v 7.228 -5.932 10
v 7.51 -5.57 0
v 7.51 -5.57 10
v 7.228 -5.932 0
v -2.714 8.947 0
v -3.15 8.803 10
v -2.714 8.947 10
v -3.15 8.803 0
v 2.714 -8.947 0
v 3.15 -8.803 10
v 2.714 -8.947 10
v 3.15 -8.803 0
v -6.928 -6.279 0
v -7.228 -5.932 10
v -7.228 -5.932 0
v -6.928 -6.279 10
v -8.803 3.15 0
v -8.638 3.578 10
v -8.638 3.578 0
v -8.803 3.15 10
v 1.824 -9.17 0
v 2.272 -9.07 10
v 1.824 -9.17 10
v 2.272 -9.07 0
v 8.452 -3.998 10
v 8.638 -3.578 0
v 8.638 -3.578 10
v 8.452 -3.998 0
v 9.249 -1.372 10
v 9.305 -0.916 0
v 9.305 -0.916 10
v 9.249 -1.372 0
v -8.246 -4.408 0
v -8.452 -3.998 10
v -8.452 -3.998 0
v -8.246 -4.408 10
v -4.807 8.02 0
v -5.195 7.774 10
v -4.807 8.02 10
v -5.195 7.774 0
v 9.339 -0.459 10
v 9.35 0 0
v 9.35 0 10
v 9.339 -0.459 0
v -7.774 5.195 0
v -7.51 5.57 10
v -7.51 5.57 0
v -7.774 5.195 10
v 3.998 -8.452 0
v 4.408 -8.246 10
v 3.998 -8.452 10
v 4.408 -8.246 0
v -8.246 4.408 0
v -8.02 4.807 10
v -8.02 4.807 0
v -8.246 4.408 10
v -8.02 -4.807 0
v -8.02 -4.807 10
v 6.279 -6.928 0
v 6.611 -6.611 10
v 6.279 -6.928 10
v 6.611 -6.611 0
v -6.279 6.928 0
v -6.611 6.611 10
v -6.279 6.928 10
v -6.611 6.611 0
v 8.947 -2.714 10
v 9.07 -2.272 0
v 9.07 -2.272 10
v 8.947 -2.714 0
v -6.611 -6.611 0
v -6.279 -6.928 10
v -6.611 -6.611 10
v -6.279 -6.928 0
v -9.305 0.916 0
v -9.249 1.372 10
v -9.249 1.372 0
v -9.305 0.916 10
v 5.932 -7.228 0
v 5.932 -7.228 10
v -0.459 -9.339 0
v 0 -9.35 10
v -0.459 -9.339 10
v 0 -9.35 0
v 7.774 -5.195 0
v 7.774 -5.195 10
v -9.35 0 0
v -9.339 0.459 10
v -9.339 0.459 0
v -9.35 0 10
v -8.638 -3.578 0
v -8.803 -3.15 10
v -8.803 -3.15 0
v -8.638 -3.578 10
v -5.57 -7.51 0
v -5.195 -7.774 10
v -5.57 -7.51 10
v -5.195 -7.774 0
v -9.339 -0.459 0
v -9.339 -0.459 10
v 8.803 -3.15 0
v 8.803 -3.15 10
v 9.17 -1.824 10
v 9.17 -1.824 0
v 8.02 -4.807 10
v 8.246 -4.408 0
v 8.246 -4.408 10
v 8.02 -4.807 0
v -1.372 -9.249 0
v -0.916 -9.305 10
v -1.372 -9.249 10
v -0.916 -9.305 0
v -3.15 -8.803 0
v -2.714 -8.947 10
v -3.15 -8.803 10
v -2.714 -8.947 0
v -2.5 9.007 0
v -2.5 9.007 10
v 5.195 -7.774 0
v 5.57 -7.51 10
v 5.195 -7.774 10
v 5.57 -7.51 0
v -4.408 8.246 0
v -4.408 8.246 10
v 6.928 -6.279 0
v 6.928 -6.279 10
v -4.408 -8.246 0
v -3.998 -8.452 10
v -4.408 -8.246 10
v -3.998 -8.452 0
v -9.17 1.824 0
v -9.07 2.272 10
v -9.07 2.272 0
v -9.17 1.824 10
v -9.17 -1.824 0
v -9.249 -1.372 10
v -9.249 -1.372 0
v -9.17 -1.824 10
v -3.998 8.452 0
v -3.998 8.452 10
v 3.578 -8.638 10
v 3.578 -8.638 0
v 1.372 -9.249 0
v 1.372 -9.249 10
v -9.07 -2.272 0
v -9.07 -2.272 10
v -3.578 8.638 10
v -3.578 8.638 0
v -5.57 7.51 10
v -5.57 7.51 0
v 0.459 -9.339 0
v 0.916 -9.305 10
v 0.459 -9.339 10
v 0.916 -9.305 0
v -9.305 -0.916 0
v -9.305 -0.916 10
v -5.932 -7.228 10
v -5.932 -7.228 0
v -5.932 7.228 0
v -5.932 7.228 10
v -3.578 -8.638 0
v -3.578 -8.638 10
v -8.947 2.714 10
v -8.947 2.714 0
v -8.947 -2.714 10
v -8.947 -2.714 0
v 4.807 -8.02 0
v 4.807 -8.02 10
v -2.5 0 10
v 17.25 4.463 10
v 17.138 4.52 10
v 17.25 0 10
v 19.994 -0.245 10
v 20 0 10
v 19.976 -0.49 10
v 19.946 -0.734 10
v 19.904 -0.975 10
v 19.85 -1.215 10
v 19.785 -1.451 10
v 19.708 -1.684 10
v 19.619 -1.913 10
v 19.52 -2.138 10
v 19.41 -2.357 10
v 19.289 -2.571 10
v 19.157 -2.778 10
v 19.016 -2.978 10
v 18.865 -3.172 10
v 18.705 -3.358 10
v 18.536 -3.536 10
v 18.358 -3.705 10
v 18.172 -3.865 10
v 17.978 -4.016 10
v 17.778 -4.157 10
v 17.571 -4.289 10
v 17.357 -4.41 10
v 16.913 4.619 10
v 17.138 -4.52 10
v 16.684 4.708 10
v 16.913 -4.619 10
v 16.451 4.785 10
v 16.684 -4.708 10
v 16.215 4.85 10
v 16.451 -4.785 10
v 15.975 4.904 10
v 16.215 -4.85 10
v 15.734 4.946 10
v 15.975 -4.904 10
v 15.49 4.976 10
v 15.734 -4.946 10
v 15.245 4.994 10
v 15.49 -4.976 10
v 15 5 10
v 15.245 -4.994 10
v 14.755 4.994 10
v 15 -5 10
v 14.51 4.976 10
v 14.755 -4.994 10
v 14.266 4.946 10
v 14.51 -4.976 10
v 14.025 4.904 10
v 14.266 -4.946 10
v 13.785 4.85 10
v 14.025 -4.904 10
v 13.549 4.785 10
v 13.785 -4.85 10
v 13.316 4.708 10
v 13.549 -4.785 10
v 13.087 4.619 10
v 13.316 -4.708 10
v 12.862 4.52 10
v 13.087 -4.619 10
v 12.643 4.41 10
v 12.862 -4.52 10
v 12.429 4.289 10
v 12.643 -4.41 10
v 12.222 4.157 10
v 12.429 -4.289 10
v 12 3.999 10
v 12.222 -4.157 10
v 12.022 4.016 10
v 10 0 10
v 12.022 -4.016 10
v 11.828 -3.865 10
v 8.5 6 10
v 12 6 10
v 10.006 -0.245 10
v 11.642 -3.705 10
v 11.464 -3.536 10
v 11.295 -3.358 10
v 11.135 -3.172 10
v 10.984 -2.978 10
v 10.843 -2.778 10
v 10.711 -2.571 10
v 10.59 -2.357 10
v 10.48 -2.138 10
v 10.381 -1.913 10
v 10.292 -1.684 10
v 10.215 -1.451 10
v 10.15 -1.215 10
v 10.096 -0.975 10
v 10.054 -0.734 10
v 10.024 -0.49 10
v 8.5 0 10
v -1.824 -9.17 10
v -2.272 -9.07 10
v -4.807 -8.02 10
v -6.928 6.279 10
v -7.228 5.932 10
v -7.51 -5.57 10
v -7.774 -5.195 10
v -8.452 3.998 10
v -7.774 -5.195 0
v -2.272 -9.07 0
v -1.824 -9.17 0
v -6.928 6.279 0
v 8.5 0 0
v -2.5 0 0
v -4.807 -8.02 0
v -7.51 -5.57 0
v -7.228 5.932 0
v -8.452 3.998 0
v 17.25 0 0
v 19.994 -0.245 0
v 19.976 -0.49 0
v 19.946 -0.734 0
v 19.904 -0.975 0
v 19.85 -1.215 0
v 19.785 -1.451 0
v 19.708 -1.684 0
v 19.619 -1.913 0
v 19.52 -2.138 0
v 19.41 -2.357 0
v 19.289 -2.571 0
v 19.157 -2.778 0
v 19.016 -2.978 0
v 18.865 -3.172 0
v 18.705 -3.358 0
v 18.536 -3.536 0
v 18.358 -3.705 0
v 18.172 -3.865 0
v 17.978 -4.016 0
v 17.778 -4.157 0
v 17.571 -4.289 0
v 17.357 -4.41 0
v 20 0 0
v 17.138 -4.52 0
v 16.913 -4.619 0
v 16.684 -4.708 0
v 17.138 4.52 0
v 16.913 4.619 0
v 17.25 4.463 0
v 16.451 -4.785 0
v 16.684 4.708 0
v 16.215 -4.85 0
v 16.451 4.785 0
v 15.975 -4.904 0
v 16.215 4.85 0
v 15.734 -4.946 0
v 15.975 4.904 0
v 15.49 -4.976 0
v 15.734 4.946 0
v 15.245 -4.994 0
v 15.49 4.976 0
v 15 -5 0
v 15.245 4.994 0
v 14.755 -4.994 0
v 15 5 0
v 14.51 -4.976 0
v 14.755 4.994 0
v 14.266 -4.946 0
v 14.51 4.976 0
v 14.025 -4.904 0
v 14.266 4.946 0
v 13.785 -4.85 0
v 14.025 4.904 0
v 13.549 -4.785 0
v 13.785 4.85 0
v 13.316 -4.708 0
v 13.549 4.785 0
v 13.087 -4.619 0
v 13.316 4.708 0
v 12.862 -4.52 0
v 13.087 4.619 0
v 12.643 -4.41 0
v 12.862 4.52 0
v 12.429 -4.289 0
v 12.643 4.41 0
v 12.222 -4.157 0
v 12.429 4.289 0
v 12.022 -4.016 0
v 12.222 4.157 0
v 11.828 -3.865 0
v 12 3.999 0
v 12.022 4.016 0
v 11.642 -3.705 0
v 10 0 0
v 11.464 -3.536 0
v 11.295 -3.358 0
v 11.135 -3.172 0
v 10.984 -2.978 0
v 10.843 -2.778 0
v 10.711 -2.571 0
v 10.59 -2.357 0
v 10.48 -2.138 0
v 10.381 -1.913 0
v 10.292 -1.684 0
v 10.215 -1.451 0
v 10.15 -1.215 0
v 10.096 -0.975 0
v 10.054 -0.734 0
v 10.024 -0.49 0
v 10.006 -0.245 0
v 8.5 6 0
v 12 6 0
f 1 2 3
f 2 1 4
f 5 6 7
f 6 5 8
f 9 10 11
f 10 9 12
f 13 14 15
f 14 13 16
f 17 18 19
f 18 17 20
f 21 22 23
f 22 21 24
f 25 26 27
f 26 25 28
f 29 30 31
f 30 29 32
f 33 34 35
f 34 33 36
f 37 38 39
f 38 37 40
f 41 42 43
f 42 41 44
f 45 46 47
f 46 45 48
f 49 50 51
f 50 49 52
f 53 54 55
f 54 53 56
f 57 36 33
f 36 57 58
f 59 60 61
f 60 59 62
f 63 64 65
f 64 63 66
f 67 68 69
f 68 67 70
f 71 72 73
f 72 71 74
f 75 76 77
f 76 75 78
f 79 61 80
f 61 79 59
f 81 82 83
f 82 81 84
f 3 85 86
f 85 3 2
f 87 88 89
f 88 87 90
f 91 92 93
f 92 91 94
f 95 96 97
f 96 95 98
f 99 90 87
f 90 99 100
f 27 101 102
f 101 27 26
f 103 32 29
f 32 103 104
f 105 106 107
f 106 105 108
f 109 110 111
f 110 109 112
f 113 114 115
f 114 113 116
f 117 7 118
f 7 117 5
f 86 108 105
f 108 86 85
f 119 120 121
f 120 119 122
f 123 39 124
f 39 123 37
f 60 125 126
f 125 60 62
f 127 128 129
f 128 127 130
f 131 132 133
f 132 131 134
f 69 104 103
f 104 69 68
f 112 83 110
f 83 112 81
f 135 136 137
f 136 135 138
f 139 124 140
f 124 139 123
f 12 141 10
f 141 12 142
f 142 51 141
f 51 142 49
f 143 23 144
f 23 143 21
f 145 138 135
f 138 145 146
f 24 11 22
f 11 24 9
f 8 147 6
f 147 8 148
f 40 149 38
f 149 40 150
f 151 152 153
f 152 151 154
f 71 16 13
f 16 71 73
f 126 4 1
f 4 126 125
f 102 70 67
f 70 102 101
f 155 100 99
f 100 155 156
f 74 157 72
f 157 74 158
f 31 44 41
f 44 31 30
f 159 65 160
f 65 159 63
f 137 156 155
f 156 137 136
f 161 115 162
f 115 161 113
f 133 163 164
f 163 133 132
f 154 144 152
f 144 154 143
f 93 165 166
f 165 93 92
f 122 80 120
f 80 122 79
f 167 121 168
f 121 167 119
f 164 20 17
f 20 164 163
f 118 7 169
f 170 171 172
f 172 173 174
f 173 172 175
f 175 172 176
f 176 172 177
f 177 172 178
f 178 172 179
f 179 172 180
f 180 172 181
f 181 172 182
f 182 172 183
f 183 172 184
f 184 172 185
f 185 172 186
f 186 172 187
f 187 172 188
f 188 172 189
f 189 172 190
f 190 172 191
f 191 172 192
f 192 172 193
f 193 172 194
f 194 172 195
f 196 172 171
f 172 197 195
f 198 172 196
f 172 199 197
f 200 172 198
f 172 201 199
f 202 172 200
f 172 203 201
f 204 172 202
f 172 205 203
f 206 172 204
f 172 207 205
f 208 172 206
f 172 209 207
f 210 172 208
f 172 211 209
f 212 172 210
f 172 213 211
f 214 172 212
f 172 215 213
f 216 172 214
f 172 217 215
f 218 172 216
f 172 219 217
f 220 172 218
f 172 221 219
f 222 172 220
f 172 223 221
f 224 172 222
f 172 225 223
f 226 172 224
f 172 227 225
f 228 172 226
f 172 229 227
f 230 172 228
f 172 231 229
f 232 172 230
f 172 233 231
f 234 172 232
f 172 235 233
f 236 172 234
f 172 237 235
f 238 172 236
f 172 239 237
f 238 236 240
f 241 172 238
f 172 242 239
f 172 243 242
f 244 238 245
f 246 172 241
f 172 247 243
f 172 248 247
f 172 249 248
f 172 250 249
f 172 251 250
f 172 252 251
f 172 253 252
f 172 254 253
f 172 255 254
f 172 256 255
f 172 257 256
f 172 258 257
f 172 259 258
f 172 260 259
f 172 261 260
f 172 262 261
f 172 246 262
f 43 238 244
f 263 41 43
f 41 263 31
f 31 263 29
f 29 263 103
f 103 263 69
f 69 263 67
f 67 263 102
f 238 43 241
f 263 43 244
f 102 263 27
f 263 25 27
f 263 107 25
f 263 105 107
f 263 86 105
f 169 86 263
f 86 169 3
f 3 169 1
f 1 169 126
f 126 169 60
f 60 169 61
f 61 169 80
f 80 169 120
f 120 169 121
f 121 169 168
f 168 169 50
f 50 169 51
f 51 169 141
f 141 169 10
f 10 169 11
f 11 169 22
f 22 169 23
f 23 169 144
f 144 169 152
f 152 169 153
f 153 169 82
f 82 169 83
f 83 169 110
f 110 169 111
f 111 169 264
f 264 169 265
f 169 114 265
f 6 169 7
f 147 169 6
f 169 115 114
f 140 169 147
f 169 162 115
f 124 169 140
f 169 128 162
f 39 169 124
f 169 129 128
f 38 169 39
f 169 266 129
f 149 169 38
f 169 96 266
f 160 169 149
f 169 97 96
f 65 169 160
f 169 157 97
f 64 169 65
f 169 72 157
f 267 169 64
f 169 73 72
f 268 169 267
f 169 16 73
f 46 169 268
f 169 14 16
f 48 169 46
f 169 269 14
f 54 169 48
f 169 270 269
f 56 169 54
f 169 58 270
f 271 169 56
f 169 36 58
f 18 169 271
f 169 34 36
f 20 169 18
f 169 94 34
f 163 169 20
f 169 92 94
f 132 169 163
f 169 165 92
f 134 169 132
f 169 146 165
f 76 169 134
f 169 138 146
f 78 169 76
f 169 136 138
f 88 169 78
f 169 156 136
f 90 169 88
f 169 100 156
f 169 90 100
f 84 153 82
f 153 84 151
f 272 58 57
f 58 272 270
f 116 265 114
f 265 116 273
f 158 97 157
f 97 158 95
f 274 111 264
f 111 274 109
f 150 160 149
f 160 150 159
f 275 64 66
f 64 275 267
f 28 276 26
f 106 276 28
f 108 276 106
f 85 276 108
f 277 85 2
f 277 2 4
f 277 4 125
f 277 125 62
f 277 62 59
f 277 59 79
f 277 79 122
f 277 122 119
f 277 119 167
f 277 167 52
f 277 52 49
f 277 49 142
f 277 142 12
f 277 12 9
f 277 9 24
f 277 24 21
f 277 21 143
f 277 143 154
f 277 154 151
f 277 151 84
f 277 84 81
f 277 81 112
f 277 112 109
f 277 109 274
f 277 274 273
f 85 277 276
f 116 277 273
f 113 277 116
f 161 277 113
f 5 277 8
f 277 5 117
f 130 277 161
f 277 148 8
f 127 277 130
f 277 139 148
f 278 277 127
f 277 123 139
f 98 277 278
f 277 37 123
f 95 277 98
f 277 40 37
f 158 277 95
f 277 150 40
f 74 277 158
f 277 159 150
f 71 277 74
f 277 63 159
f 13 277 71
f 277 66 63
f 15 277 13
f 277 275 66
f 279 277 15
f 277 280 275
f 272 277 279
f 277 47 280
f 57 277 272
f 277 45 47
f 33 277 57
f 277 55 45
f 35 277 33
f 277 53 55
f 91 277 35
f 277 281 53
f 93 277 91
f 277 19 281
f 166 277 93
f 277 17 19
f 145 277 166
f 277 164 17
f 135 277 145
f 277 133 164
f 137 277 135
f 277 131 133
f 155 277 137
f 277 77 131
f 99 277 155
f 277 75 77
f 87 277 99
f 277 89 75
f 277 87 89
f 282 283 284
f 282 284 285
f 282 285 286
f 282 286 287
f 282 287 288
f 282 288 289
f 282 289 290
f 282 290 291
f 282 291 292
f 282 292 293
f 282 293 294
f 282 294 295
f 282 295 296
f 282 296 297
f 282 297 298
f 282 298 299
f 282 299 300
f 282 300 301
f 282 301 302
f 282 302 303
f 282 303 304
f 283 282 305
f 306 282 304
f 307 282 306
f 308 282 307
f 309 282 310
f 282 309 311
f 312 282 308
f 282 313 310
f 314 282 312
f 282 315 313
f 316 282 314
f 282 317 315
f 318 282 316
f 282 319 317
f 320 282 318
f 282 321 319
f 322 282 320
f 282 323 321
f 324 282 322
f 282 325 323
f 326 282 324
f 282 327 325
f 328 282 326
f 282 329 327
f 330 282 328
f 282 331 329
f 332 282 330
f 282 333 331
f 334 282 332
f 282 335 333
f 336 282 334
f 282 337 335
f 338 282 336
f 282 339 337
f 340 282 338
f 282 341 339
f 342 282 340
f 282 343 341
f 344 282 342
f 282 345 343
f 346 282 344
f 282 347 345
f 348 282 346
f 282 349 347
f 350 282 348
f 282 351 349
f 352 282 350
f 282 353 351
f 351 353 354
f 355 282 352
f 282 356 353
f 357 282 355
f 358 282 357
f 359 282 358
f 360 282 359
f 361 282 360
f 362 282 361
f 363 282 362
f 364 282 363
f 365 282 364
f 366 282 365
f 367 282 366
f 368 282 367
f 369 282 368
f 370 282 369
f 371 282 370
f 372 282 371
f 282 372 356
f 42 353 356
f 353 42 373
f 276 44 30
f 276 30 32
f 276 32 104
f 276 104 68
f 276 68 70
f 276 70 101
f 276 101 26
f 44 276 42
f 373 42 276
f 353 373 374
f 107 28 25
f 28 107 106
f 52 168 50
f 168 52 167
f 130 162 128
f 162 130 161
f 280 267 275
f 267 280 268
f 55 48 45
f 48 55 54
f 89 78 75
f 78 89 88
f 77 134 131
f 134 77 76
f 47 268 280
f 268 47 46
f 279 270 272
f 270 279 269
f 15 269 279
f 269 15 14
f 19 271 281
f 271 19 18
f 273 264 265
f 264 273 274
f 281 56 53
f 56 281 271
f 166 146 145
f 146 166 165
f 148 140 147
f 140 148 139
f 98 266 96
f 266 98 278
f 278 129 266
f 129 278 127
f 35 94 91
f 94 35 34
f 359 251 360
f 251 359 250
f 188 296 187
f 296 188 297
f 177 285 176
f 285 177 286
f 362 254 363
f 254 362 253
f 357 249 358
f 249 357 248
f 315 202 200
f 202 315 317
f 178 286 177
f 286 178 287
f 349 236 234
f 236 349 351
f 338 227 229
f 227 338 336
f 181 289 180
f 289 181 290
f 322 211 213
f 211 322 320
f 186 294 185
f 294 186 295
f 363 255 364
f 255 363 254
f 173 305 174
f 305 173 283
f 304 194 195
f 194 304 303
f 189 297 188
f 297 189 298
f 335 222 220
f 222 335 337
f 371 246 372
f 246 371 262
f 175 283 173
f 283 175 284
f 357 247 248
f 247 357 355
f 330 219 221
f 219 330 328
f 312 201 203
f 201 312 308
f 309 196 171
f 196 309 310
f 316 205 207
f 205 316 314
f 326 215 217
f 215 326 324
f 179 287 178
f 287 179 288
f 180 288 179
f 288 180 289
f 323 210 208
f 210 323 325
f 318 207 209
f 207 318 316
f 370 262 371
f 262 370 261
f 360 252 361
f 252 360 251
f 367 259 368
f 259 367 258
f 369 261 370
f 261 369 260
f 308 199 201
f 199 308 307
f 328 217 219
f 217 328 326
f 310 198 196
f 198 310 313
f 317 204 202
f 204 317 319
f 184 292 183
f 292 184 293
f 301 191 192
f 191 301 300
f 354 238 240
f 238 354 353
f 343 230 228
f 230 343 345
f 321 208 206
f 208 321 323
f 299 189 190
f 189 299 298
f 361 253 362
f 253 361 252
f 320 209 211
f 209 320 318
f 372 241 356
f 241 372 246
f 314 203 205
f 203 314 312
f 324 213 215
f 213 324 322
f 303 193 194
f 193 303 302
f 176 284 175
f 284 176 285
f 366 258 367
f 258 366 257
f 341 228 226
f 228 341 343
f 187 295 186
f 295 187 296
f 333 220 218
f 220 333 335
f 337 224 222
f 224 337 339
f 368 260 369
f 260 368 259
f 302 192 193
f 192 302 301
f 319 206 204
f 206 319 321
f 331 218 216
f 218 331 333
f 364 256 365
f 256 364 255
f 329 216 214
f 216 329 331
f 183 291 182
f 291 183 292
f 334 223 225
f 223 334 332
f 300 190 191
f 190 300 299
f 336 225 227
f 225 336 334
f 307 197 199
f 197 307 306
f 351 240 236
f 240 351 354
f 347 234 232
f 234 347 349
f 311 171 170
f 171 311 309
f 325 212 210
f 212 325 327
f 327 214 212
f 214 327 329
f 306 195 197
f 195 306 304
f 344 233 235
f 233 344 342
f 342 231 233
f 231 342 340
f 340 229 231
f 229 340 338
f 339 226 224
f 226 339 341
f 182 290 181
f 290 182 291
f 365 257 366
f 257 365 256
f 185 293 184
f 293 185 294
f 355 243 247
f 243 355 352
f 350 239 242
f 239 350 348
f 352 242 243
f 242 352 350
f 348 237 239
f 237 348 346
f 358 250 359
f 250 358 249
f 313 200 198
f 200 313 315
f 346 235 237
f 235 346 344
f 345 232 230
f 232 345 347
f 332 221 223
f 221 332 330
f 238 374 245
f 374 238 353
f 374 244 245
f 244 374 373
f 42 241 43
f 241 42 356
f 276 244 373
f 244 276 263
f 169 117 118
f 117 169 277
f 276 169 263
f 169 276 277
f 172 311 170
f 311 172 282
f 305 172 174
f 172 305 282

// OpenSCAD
$fn = 128; // High resolution for smooth curves and accurate hole sizes

// --- Dimensions ---
// Rod dimensions
$rod_diameter = 12.7;
$rod_radius = $rod_diameter / 2;
$rod_wall_thickness = 3;
$rod_outer_diameter = $rod_diameter + (2 * $rod_wall_thickness);
$rod_outer_radius = $rod_outer_diameter / 2;

// Tubing dimensions
$tubing_diameter = 6;
$tubing_radius = $tubing_diameter / 2;
$tubing_wall_thickness = 2;
$tubing_outer_diameter = $tubing_diameter + (2 * $tubing_wall_thickness);
$tubing_outer_radius = $tubing_outer_diameter / 2;

// Positioning
$bridge_start_x = 8;
$bridge_end_x = 12;
$bridge_width_y = 6;

// Cutout dimensions
$rod_cutout_width = 10;
$rod_cutout_half_y = 5;

$tubing_cutout_width = 4.5;
$tubing_cutout_half_y = 2.25;

// Extrusion height
$height = 10;

// --- Main Module ---
module snap_on_clip() {
    difference() {
        // 1. Create the solid base profile (Union of all parts)
        union() {
            // Rod Ring
            cylinder(h = $height, r = $rod_outer_radius, center = [0, 0, $height/2]);
            
            // Tubing Ring (Positioned at x=15, y=0)
            translate([15, 0, 0]) {
                cylinder(h = $height, r = $tubing_outer_radius, center = [0, 0, $height/2]);
            }
            
            // Solid Bridge (Positioned between x=8 and x=12)
            // Width is 6mm in Y, centered at y=0 -> y from -3 to 3
            translate([$bridge_start_x, 0, 0]) {
                cube([($bridge_end_x - $bridge_start_x), $bridge_width_y, $height], center = [0, 0, $height/2]);
            }
        }
        
        // 2. Cut out the Rod Opening (-X side)
        // Region: x < 0, -5 < y < 5.
        // Cutout Box: x from -5 to 0 (width 10), y from -5 to 5 (width 10).
        // Center of this box: x = -2.5, y = 0.
        // We add 1mm buffer to ensure we cut through the wall.
        translate([-2.5, 0, 0]) {
            cube([($rod_cutout_width + 1), ($rod_cutout_half_y * 2 + 1), $height + 1], 
                  center = [0, 0, $height/2]);
        }
        
        // 3. Cut out the Tubing Opening (+X side)
        // Region: x > 15, -2.25 < y < 2.25.
        // Cutout Box: x from 15 to 19.5 (width 4.5), y from -2.25 to 2.25 (width 4.5).
        // Center of this box: x = 15 + (4.5/2) = 17.25, y = 0.
        // We add 1mm buffer to ensure we cut through the wall.
        translate([17.25, 0, 0]) {
            cube([$tubing_cutout_width + 1, ($tubing_cutout_half_y * 2) + 1, $height + 1], 
                  center = [0, 0, $height/2]);
        }
    }
}

// Generate the part
snap_on_clip();
